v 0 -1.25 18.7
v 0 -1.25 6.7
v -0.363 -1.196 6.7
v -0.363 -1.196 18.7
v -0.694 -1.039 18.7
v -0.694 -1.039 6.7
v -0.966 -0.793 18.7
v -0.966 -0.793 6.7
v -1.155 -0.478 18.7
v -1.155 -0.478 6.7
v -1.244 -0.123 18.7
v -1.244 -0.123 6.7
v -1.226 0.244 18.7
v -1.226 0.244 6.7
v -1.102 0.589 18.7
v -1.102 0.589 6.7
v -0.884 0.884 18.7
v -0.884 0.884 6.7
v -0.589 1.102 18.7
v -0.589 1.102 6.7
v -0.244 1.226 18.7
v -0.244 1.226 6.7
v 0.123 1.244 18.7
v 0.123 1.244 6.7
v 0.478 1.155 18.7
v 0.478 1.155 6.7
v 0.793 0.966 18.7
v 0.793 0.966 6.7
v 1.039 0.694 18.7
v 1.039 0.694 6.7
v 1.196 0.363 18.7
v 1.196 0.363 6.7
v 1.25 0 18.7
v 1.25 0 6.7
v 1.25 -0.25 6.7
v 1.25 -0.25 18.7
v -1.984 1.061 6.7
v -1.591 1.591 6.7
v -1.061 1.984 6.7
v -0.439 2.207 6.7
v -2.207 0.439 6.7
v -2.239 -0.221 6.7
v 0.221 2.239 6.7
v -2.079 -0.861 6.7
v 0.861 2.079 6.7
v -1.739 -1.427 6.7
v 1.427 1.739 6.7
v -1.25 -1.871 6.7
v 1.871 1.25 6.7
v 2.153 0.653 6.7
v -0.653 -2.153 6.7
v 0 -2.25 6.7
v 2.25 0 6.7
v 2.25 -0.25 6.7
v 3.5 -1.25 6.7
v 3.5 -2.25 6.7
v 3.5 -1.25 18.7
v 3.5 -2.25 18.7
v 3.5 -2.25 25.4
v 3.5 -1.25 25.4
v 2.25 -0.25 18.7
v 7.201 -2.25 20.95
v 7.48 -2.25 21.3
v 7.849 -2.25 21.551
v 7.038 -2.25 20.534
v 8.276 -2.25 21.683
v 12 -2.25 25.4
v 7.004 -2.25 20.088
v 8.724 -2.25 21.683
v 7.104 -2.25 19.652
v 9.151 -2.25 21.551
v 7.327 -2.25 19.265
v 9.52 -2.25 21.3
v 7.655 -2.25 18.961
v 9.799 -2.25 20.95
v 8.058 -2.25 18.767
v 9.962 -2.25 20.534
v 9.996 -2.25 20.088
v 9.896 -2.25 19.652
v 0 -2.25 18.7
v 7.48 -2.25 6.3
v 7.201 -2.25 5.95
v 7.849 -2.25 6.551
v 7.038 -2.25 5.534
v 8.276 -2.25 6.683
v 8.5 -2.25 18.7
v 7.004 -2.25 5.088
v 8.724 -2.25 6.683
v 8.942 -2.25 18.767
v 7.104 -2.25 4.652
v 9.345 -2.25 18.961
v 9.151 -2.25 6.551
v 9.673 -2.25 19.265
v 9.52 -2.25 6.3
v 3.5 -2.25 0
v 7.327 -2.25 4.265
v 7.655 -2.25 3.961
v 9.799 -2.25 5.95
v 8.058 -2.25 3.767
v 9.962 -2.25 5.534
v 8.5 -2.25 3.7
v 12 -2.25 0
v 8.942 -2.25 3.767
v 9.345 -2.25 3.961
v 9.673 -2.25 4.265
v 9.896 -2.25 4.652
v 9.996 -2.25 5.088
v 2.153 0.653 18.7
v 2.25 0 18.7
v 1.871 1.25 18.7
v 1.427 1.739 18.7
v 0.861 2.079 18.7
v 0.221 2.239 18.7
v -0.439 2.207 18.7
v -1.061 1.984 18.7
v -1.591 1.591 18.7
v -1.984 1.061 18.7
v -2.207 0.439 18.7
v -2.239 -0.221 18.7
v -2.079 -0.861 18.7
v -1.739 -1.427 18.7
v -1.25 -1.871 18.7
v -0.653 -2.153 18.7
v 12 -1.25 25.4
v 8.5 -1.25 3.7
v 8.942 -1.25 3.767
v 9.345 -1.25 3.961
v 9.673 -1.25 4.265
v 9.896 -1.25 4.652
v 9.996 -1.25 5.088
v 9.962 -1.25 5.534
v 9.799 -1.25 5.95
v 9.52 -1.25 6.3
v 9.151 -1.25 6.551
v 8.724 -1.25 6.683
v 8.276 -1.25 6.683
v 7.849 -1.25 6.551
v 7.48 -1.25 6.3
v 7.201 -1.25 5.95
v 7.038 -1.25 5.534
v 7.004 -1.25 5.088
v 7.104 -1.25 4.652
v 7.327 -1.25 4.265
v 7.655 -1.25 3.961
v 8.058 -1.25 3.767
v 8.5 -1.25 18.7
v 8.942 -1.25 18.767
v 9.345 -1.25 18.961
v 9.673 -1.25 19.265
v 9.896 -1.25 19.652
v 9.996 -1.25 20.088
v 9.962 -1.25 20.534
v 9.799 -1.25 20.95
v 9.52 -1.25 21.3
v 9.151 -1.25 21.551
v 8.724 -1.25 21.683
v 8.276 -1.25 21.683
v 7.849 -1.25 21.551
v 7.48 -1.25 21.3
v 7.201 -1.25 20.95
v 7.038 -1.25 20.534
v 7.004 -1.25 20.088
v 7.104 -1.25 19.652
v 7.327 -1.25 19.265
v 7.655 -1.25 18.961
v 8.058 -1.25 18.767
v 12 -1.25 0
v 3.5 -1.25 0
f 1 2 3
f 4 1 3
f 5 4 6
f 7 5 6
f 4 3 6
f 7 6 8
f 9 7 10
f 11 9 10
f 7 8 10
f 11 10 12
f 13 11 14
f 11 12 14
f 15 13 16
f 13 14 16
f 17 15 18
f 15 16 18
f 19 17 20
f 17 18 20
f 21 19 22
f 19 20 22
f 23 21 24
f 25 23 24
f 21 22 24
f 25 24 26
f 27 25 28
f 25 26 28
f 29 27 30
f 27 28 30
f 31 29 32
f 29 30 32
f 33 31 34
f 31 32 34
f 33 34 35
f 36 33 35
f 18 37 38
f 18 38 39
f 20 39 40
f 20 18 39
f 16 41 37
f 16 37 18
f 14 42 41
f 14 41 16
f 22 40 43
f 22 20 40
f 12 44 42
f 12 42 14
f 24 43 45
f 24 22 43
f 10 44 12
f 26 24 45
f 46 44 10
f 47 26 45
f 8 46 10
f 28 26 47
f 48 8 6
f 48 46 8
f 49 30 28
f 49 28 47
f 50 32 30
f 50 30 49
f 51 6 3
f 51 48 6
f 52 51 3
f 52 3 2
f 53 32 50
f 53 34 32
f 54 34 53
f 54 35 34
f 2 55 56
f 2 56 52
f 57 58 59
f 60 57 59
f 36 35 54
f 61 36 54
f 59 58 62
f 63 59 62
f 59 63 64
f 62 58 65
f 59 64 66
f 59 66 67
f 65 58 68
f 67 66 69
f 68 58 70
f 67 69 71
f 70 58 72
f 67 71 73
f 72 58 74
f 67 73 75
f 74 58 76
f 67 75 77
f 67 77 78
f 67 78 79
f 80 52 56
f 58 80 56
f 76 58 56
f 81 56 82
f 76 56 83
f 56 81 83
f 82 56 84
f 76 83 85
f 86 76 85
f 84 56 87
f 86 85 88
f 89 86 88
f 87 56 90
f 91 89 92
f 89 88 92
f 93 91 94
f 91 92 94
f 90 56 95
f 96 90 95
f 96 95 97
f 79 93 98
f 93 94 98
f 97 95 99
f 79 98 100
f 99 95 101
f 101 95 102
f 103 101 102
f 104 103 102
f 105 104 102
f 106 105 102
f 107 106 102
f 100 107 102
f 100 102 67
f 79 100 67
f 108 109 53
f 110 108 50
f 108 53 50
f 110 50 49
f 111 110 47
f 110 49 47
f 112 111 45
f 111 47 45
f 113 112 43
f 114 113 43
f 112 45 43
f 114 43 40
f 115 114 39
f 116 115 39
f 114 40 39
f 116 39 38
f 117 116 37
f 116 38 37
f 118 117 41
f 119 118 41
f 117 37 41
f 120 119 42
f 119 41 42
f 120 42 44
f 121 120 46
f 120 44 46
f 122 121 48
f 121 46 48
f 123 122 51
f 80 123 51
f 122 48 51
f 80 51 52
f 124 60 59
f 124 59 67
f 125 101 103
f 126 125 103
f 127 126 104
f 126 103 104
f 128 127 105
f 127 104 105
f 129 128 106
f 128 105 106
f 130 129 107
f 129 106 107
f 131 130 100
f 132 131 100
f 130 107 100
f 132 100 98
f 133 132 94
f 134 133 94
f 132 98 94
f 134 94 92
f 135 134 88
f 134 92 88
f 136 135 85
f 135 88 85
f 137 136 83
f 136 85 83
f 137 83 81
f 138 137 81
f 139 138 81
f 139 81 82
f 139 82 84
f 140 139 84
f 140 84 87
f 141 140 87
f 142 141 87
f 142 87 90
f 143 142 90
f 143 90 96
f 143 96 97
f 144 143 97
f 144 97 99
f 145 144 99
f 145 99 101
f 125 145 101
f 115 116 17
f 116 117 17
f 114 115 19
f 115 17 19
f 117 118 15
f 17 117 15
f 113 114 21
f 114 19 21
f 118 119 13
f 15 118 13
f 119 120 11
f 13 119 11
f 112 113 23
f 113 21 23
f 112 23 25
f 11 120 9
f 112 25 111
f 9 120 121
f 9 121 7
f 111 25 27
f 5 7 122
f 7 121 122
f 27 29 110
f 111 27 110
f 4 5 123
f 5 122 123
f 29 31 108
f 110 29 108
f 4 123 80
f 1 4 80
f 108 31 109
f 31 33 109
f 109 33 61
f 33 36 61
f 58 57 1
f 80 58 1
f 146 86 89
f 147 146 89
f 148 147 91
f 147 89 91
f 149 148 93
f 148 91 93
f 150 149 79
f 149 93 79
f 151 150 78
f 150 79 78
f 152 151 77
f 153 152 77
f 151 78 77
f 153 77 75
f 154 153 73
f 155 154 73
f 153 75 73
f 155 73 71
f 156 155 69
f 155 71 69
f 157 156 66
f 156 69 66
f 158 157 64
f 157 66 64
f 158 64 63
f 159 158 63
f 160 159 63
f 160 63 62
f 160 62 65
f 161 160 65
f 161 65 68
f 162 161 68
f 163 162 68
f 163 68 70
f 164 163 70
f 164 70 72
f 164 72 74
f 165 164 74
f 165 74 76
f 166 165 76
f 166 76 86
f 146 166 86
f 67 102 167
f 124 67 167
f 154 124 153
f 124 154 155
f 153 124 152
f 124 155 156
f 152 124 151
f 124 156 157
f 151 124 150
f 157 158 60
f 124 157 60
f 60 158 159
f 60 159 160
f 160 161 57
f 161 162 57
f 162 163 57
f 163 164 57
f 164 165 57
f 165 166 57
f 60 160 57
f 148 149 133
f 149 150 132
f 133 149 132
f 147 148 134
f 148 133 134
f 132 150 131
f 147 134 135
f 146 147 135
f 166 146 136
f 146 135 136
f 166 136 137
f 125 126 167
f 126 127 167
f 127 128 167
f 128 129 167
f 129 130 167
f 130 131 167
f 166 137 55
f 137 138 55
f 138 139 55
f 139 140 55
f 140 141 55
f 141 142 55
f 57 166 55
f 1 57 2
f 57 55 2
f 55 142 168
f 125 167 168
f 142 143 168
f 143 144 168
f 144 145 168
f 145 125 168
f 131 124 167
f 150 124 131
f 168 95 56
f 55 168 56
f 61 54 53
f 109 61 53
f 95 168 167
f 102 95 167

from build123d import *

# Parameters (mm, degrees)
SALIENTE_EXTRUIR1_DEPTH = 25.4
CROQUIS4_R              = 1.5
CROQUIS4_W              = 5.75
CROQUIS4_H              = 6.7
CORTAR_EXTRUIR3_DEPTH   = 29.45013181


with BuildPart() as part:
    # Croquis1 → Saliente-Extruir1 (new body)
    with BuildSketch(Plane.XY):
        with BuildLine():
            Line((0, -2.25), (12, -2.25))
            Line((12, -2.25), (12, -1.25))
            Line((12, -1.25), (1.870828693, -1.25))
            Line((1.870828693, -1.25), (0, -1.25))
            ThreePointArc((0, -1.25), (-0.883883476, 0.883883476), (1.25, 0))
            Line((1.25, 0), (1.25, -0.25))
            Line((1.25, -0.25), (2.236067977, -0.25))
            Line((2.236067977, -0.25), (2.25, -0.25))
            Line((2.25, -0.25), (2.25, 0))
            ThreePointArc((2.25, 0), (-1.590990258, 1.590990258), (0, -2.25))
        make_face()
    extrude(amount=SALIENTE_EXTRUIR1_DEPTH)

    # Croquis4 → Cortar-Extruir3 (cut, through all)
    with BuildSketch(Plane.XZ.offset(2.25)):
        with Locations(Location((8.5, 20.2, 0), (0, 0, 270))):
            Circle(CROQUIS4_R)
        with Locations(Location((8.5, 5.2, 0), (0, 0, 270))):
            Circle(CROQUIS4_R)
        with Locations((0.625, 22.05)):
            Rectangle(CROQUIS4_W, CROQUIS4_H)
        with Locations((0.625, 3.35)):
            Rectangle(CROQUIS4_W, CROQUIS4_H)
    extrude(amount=-CORTAR_EXTRUIR3_DEPTH, mode=Mode.SUBTRACT)


solid = part.part
